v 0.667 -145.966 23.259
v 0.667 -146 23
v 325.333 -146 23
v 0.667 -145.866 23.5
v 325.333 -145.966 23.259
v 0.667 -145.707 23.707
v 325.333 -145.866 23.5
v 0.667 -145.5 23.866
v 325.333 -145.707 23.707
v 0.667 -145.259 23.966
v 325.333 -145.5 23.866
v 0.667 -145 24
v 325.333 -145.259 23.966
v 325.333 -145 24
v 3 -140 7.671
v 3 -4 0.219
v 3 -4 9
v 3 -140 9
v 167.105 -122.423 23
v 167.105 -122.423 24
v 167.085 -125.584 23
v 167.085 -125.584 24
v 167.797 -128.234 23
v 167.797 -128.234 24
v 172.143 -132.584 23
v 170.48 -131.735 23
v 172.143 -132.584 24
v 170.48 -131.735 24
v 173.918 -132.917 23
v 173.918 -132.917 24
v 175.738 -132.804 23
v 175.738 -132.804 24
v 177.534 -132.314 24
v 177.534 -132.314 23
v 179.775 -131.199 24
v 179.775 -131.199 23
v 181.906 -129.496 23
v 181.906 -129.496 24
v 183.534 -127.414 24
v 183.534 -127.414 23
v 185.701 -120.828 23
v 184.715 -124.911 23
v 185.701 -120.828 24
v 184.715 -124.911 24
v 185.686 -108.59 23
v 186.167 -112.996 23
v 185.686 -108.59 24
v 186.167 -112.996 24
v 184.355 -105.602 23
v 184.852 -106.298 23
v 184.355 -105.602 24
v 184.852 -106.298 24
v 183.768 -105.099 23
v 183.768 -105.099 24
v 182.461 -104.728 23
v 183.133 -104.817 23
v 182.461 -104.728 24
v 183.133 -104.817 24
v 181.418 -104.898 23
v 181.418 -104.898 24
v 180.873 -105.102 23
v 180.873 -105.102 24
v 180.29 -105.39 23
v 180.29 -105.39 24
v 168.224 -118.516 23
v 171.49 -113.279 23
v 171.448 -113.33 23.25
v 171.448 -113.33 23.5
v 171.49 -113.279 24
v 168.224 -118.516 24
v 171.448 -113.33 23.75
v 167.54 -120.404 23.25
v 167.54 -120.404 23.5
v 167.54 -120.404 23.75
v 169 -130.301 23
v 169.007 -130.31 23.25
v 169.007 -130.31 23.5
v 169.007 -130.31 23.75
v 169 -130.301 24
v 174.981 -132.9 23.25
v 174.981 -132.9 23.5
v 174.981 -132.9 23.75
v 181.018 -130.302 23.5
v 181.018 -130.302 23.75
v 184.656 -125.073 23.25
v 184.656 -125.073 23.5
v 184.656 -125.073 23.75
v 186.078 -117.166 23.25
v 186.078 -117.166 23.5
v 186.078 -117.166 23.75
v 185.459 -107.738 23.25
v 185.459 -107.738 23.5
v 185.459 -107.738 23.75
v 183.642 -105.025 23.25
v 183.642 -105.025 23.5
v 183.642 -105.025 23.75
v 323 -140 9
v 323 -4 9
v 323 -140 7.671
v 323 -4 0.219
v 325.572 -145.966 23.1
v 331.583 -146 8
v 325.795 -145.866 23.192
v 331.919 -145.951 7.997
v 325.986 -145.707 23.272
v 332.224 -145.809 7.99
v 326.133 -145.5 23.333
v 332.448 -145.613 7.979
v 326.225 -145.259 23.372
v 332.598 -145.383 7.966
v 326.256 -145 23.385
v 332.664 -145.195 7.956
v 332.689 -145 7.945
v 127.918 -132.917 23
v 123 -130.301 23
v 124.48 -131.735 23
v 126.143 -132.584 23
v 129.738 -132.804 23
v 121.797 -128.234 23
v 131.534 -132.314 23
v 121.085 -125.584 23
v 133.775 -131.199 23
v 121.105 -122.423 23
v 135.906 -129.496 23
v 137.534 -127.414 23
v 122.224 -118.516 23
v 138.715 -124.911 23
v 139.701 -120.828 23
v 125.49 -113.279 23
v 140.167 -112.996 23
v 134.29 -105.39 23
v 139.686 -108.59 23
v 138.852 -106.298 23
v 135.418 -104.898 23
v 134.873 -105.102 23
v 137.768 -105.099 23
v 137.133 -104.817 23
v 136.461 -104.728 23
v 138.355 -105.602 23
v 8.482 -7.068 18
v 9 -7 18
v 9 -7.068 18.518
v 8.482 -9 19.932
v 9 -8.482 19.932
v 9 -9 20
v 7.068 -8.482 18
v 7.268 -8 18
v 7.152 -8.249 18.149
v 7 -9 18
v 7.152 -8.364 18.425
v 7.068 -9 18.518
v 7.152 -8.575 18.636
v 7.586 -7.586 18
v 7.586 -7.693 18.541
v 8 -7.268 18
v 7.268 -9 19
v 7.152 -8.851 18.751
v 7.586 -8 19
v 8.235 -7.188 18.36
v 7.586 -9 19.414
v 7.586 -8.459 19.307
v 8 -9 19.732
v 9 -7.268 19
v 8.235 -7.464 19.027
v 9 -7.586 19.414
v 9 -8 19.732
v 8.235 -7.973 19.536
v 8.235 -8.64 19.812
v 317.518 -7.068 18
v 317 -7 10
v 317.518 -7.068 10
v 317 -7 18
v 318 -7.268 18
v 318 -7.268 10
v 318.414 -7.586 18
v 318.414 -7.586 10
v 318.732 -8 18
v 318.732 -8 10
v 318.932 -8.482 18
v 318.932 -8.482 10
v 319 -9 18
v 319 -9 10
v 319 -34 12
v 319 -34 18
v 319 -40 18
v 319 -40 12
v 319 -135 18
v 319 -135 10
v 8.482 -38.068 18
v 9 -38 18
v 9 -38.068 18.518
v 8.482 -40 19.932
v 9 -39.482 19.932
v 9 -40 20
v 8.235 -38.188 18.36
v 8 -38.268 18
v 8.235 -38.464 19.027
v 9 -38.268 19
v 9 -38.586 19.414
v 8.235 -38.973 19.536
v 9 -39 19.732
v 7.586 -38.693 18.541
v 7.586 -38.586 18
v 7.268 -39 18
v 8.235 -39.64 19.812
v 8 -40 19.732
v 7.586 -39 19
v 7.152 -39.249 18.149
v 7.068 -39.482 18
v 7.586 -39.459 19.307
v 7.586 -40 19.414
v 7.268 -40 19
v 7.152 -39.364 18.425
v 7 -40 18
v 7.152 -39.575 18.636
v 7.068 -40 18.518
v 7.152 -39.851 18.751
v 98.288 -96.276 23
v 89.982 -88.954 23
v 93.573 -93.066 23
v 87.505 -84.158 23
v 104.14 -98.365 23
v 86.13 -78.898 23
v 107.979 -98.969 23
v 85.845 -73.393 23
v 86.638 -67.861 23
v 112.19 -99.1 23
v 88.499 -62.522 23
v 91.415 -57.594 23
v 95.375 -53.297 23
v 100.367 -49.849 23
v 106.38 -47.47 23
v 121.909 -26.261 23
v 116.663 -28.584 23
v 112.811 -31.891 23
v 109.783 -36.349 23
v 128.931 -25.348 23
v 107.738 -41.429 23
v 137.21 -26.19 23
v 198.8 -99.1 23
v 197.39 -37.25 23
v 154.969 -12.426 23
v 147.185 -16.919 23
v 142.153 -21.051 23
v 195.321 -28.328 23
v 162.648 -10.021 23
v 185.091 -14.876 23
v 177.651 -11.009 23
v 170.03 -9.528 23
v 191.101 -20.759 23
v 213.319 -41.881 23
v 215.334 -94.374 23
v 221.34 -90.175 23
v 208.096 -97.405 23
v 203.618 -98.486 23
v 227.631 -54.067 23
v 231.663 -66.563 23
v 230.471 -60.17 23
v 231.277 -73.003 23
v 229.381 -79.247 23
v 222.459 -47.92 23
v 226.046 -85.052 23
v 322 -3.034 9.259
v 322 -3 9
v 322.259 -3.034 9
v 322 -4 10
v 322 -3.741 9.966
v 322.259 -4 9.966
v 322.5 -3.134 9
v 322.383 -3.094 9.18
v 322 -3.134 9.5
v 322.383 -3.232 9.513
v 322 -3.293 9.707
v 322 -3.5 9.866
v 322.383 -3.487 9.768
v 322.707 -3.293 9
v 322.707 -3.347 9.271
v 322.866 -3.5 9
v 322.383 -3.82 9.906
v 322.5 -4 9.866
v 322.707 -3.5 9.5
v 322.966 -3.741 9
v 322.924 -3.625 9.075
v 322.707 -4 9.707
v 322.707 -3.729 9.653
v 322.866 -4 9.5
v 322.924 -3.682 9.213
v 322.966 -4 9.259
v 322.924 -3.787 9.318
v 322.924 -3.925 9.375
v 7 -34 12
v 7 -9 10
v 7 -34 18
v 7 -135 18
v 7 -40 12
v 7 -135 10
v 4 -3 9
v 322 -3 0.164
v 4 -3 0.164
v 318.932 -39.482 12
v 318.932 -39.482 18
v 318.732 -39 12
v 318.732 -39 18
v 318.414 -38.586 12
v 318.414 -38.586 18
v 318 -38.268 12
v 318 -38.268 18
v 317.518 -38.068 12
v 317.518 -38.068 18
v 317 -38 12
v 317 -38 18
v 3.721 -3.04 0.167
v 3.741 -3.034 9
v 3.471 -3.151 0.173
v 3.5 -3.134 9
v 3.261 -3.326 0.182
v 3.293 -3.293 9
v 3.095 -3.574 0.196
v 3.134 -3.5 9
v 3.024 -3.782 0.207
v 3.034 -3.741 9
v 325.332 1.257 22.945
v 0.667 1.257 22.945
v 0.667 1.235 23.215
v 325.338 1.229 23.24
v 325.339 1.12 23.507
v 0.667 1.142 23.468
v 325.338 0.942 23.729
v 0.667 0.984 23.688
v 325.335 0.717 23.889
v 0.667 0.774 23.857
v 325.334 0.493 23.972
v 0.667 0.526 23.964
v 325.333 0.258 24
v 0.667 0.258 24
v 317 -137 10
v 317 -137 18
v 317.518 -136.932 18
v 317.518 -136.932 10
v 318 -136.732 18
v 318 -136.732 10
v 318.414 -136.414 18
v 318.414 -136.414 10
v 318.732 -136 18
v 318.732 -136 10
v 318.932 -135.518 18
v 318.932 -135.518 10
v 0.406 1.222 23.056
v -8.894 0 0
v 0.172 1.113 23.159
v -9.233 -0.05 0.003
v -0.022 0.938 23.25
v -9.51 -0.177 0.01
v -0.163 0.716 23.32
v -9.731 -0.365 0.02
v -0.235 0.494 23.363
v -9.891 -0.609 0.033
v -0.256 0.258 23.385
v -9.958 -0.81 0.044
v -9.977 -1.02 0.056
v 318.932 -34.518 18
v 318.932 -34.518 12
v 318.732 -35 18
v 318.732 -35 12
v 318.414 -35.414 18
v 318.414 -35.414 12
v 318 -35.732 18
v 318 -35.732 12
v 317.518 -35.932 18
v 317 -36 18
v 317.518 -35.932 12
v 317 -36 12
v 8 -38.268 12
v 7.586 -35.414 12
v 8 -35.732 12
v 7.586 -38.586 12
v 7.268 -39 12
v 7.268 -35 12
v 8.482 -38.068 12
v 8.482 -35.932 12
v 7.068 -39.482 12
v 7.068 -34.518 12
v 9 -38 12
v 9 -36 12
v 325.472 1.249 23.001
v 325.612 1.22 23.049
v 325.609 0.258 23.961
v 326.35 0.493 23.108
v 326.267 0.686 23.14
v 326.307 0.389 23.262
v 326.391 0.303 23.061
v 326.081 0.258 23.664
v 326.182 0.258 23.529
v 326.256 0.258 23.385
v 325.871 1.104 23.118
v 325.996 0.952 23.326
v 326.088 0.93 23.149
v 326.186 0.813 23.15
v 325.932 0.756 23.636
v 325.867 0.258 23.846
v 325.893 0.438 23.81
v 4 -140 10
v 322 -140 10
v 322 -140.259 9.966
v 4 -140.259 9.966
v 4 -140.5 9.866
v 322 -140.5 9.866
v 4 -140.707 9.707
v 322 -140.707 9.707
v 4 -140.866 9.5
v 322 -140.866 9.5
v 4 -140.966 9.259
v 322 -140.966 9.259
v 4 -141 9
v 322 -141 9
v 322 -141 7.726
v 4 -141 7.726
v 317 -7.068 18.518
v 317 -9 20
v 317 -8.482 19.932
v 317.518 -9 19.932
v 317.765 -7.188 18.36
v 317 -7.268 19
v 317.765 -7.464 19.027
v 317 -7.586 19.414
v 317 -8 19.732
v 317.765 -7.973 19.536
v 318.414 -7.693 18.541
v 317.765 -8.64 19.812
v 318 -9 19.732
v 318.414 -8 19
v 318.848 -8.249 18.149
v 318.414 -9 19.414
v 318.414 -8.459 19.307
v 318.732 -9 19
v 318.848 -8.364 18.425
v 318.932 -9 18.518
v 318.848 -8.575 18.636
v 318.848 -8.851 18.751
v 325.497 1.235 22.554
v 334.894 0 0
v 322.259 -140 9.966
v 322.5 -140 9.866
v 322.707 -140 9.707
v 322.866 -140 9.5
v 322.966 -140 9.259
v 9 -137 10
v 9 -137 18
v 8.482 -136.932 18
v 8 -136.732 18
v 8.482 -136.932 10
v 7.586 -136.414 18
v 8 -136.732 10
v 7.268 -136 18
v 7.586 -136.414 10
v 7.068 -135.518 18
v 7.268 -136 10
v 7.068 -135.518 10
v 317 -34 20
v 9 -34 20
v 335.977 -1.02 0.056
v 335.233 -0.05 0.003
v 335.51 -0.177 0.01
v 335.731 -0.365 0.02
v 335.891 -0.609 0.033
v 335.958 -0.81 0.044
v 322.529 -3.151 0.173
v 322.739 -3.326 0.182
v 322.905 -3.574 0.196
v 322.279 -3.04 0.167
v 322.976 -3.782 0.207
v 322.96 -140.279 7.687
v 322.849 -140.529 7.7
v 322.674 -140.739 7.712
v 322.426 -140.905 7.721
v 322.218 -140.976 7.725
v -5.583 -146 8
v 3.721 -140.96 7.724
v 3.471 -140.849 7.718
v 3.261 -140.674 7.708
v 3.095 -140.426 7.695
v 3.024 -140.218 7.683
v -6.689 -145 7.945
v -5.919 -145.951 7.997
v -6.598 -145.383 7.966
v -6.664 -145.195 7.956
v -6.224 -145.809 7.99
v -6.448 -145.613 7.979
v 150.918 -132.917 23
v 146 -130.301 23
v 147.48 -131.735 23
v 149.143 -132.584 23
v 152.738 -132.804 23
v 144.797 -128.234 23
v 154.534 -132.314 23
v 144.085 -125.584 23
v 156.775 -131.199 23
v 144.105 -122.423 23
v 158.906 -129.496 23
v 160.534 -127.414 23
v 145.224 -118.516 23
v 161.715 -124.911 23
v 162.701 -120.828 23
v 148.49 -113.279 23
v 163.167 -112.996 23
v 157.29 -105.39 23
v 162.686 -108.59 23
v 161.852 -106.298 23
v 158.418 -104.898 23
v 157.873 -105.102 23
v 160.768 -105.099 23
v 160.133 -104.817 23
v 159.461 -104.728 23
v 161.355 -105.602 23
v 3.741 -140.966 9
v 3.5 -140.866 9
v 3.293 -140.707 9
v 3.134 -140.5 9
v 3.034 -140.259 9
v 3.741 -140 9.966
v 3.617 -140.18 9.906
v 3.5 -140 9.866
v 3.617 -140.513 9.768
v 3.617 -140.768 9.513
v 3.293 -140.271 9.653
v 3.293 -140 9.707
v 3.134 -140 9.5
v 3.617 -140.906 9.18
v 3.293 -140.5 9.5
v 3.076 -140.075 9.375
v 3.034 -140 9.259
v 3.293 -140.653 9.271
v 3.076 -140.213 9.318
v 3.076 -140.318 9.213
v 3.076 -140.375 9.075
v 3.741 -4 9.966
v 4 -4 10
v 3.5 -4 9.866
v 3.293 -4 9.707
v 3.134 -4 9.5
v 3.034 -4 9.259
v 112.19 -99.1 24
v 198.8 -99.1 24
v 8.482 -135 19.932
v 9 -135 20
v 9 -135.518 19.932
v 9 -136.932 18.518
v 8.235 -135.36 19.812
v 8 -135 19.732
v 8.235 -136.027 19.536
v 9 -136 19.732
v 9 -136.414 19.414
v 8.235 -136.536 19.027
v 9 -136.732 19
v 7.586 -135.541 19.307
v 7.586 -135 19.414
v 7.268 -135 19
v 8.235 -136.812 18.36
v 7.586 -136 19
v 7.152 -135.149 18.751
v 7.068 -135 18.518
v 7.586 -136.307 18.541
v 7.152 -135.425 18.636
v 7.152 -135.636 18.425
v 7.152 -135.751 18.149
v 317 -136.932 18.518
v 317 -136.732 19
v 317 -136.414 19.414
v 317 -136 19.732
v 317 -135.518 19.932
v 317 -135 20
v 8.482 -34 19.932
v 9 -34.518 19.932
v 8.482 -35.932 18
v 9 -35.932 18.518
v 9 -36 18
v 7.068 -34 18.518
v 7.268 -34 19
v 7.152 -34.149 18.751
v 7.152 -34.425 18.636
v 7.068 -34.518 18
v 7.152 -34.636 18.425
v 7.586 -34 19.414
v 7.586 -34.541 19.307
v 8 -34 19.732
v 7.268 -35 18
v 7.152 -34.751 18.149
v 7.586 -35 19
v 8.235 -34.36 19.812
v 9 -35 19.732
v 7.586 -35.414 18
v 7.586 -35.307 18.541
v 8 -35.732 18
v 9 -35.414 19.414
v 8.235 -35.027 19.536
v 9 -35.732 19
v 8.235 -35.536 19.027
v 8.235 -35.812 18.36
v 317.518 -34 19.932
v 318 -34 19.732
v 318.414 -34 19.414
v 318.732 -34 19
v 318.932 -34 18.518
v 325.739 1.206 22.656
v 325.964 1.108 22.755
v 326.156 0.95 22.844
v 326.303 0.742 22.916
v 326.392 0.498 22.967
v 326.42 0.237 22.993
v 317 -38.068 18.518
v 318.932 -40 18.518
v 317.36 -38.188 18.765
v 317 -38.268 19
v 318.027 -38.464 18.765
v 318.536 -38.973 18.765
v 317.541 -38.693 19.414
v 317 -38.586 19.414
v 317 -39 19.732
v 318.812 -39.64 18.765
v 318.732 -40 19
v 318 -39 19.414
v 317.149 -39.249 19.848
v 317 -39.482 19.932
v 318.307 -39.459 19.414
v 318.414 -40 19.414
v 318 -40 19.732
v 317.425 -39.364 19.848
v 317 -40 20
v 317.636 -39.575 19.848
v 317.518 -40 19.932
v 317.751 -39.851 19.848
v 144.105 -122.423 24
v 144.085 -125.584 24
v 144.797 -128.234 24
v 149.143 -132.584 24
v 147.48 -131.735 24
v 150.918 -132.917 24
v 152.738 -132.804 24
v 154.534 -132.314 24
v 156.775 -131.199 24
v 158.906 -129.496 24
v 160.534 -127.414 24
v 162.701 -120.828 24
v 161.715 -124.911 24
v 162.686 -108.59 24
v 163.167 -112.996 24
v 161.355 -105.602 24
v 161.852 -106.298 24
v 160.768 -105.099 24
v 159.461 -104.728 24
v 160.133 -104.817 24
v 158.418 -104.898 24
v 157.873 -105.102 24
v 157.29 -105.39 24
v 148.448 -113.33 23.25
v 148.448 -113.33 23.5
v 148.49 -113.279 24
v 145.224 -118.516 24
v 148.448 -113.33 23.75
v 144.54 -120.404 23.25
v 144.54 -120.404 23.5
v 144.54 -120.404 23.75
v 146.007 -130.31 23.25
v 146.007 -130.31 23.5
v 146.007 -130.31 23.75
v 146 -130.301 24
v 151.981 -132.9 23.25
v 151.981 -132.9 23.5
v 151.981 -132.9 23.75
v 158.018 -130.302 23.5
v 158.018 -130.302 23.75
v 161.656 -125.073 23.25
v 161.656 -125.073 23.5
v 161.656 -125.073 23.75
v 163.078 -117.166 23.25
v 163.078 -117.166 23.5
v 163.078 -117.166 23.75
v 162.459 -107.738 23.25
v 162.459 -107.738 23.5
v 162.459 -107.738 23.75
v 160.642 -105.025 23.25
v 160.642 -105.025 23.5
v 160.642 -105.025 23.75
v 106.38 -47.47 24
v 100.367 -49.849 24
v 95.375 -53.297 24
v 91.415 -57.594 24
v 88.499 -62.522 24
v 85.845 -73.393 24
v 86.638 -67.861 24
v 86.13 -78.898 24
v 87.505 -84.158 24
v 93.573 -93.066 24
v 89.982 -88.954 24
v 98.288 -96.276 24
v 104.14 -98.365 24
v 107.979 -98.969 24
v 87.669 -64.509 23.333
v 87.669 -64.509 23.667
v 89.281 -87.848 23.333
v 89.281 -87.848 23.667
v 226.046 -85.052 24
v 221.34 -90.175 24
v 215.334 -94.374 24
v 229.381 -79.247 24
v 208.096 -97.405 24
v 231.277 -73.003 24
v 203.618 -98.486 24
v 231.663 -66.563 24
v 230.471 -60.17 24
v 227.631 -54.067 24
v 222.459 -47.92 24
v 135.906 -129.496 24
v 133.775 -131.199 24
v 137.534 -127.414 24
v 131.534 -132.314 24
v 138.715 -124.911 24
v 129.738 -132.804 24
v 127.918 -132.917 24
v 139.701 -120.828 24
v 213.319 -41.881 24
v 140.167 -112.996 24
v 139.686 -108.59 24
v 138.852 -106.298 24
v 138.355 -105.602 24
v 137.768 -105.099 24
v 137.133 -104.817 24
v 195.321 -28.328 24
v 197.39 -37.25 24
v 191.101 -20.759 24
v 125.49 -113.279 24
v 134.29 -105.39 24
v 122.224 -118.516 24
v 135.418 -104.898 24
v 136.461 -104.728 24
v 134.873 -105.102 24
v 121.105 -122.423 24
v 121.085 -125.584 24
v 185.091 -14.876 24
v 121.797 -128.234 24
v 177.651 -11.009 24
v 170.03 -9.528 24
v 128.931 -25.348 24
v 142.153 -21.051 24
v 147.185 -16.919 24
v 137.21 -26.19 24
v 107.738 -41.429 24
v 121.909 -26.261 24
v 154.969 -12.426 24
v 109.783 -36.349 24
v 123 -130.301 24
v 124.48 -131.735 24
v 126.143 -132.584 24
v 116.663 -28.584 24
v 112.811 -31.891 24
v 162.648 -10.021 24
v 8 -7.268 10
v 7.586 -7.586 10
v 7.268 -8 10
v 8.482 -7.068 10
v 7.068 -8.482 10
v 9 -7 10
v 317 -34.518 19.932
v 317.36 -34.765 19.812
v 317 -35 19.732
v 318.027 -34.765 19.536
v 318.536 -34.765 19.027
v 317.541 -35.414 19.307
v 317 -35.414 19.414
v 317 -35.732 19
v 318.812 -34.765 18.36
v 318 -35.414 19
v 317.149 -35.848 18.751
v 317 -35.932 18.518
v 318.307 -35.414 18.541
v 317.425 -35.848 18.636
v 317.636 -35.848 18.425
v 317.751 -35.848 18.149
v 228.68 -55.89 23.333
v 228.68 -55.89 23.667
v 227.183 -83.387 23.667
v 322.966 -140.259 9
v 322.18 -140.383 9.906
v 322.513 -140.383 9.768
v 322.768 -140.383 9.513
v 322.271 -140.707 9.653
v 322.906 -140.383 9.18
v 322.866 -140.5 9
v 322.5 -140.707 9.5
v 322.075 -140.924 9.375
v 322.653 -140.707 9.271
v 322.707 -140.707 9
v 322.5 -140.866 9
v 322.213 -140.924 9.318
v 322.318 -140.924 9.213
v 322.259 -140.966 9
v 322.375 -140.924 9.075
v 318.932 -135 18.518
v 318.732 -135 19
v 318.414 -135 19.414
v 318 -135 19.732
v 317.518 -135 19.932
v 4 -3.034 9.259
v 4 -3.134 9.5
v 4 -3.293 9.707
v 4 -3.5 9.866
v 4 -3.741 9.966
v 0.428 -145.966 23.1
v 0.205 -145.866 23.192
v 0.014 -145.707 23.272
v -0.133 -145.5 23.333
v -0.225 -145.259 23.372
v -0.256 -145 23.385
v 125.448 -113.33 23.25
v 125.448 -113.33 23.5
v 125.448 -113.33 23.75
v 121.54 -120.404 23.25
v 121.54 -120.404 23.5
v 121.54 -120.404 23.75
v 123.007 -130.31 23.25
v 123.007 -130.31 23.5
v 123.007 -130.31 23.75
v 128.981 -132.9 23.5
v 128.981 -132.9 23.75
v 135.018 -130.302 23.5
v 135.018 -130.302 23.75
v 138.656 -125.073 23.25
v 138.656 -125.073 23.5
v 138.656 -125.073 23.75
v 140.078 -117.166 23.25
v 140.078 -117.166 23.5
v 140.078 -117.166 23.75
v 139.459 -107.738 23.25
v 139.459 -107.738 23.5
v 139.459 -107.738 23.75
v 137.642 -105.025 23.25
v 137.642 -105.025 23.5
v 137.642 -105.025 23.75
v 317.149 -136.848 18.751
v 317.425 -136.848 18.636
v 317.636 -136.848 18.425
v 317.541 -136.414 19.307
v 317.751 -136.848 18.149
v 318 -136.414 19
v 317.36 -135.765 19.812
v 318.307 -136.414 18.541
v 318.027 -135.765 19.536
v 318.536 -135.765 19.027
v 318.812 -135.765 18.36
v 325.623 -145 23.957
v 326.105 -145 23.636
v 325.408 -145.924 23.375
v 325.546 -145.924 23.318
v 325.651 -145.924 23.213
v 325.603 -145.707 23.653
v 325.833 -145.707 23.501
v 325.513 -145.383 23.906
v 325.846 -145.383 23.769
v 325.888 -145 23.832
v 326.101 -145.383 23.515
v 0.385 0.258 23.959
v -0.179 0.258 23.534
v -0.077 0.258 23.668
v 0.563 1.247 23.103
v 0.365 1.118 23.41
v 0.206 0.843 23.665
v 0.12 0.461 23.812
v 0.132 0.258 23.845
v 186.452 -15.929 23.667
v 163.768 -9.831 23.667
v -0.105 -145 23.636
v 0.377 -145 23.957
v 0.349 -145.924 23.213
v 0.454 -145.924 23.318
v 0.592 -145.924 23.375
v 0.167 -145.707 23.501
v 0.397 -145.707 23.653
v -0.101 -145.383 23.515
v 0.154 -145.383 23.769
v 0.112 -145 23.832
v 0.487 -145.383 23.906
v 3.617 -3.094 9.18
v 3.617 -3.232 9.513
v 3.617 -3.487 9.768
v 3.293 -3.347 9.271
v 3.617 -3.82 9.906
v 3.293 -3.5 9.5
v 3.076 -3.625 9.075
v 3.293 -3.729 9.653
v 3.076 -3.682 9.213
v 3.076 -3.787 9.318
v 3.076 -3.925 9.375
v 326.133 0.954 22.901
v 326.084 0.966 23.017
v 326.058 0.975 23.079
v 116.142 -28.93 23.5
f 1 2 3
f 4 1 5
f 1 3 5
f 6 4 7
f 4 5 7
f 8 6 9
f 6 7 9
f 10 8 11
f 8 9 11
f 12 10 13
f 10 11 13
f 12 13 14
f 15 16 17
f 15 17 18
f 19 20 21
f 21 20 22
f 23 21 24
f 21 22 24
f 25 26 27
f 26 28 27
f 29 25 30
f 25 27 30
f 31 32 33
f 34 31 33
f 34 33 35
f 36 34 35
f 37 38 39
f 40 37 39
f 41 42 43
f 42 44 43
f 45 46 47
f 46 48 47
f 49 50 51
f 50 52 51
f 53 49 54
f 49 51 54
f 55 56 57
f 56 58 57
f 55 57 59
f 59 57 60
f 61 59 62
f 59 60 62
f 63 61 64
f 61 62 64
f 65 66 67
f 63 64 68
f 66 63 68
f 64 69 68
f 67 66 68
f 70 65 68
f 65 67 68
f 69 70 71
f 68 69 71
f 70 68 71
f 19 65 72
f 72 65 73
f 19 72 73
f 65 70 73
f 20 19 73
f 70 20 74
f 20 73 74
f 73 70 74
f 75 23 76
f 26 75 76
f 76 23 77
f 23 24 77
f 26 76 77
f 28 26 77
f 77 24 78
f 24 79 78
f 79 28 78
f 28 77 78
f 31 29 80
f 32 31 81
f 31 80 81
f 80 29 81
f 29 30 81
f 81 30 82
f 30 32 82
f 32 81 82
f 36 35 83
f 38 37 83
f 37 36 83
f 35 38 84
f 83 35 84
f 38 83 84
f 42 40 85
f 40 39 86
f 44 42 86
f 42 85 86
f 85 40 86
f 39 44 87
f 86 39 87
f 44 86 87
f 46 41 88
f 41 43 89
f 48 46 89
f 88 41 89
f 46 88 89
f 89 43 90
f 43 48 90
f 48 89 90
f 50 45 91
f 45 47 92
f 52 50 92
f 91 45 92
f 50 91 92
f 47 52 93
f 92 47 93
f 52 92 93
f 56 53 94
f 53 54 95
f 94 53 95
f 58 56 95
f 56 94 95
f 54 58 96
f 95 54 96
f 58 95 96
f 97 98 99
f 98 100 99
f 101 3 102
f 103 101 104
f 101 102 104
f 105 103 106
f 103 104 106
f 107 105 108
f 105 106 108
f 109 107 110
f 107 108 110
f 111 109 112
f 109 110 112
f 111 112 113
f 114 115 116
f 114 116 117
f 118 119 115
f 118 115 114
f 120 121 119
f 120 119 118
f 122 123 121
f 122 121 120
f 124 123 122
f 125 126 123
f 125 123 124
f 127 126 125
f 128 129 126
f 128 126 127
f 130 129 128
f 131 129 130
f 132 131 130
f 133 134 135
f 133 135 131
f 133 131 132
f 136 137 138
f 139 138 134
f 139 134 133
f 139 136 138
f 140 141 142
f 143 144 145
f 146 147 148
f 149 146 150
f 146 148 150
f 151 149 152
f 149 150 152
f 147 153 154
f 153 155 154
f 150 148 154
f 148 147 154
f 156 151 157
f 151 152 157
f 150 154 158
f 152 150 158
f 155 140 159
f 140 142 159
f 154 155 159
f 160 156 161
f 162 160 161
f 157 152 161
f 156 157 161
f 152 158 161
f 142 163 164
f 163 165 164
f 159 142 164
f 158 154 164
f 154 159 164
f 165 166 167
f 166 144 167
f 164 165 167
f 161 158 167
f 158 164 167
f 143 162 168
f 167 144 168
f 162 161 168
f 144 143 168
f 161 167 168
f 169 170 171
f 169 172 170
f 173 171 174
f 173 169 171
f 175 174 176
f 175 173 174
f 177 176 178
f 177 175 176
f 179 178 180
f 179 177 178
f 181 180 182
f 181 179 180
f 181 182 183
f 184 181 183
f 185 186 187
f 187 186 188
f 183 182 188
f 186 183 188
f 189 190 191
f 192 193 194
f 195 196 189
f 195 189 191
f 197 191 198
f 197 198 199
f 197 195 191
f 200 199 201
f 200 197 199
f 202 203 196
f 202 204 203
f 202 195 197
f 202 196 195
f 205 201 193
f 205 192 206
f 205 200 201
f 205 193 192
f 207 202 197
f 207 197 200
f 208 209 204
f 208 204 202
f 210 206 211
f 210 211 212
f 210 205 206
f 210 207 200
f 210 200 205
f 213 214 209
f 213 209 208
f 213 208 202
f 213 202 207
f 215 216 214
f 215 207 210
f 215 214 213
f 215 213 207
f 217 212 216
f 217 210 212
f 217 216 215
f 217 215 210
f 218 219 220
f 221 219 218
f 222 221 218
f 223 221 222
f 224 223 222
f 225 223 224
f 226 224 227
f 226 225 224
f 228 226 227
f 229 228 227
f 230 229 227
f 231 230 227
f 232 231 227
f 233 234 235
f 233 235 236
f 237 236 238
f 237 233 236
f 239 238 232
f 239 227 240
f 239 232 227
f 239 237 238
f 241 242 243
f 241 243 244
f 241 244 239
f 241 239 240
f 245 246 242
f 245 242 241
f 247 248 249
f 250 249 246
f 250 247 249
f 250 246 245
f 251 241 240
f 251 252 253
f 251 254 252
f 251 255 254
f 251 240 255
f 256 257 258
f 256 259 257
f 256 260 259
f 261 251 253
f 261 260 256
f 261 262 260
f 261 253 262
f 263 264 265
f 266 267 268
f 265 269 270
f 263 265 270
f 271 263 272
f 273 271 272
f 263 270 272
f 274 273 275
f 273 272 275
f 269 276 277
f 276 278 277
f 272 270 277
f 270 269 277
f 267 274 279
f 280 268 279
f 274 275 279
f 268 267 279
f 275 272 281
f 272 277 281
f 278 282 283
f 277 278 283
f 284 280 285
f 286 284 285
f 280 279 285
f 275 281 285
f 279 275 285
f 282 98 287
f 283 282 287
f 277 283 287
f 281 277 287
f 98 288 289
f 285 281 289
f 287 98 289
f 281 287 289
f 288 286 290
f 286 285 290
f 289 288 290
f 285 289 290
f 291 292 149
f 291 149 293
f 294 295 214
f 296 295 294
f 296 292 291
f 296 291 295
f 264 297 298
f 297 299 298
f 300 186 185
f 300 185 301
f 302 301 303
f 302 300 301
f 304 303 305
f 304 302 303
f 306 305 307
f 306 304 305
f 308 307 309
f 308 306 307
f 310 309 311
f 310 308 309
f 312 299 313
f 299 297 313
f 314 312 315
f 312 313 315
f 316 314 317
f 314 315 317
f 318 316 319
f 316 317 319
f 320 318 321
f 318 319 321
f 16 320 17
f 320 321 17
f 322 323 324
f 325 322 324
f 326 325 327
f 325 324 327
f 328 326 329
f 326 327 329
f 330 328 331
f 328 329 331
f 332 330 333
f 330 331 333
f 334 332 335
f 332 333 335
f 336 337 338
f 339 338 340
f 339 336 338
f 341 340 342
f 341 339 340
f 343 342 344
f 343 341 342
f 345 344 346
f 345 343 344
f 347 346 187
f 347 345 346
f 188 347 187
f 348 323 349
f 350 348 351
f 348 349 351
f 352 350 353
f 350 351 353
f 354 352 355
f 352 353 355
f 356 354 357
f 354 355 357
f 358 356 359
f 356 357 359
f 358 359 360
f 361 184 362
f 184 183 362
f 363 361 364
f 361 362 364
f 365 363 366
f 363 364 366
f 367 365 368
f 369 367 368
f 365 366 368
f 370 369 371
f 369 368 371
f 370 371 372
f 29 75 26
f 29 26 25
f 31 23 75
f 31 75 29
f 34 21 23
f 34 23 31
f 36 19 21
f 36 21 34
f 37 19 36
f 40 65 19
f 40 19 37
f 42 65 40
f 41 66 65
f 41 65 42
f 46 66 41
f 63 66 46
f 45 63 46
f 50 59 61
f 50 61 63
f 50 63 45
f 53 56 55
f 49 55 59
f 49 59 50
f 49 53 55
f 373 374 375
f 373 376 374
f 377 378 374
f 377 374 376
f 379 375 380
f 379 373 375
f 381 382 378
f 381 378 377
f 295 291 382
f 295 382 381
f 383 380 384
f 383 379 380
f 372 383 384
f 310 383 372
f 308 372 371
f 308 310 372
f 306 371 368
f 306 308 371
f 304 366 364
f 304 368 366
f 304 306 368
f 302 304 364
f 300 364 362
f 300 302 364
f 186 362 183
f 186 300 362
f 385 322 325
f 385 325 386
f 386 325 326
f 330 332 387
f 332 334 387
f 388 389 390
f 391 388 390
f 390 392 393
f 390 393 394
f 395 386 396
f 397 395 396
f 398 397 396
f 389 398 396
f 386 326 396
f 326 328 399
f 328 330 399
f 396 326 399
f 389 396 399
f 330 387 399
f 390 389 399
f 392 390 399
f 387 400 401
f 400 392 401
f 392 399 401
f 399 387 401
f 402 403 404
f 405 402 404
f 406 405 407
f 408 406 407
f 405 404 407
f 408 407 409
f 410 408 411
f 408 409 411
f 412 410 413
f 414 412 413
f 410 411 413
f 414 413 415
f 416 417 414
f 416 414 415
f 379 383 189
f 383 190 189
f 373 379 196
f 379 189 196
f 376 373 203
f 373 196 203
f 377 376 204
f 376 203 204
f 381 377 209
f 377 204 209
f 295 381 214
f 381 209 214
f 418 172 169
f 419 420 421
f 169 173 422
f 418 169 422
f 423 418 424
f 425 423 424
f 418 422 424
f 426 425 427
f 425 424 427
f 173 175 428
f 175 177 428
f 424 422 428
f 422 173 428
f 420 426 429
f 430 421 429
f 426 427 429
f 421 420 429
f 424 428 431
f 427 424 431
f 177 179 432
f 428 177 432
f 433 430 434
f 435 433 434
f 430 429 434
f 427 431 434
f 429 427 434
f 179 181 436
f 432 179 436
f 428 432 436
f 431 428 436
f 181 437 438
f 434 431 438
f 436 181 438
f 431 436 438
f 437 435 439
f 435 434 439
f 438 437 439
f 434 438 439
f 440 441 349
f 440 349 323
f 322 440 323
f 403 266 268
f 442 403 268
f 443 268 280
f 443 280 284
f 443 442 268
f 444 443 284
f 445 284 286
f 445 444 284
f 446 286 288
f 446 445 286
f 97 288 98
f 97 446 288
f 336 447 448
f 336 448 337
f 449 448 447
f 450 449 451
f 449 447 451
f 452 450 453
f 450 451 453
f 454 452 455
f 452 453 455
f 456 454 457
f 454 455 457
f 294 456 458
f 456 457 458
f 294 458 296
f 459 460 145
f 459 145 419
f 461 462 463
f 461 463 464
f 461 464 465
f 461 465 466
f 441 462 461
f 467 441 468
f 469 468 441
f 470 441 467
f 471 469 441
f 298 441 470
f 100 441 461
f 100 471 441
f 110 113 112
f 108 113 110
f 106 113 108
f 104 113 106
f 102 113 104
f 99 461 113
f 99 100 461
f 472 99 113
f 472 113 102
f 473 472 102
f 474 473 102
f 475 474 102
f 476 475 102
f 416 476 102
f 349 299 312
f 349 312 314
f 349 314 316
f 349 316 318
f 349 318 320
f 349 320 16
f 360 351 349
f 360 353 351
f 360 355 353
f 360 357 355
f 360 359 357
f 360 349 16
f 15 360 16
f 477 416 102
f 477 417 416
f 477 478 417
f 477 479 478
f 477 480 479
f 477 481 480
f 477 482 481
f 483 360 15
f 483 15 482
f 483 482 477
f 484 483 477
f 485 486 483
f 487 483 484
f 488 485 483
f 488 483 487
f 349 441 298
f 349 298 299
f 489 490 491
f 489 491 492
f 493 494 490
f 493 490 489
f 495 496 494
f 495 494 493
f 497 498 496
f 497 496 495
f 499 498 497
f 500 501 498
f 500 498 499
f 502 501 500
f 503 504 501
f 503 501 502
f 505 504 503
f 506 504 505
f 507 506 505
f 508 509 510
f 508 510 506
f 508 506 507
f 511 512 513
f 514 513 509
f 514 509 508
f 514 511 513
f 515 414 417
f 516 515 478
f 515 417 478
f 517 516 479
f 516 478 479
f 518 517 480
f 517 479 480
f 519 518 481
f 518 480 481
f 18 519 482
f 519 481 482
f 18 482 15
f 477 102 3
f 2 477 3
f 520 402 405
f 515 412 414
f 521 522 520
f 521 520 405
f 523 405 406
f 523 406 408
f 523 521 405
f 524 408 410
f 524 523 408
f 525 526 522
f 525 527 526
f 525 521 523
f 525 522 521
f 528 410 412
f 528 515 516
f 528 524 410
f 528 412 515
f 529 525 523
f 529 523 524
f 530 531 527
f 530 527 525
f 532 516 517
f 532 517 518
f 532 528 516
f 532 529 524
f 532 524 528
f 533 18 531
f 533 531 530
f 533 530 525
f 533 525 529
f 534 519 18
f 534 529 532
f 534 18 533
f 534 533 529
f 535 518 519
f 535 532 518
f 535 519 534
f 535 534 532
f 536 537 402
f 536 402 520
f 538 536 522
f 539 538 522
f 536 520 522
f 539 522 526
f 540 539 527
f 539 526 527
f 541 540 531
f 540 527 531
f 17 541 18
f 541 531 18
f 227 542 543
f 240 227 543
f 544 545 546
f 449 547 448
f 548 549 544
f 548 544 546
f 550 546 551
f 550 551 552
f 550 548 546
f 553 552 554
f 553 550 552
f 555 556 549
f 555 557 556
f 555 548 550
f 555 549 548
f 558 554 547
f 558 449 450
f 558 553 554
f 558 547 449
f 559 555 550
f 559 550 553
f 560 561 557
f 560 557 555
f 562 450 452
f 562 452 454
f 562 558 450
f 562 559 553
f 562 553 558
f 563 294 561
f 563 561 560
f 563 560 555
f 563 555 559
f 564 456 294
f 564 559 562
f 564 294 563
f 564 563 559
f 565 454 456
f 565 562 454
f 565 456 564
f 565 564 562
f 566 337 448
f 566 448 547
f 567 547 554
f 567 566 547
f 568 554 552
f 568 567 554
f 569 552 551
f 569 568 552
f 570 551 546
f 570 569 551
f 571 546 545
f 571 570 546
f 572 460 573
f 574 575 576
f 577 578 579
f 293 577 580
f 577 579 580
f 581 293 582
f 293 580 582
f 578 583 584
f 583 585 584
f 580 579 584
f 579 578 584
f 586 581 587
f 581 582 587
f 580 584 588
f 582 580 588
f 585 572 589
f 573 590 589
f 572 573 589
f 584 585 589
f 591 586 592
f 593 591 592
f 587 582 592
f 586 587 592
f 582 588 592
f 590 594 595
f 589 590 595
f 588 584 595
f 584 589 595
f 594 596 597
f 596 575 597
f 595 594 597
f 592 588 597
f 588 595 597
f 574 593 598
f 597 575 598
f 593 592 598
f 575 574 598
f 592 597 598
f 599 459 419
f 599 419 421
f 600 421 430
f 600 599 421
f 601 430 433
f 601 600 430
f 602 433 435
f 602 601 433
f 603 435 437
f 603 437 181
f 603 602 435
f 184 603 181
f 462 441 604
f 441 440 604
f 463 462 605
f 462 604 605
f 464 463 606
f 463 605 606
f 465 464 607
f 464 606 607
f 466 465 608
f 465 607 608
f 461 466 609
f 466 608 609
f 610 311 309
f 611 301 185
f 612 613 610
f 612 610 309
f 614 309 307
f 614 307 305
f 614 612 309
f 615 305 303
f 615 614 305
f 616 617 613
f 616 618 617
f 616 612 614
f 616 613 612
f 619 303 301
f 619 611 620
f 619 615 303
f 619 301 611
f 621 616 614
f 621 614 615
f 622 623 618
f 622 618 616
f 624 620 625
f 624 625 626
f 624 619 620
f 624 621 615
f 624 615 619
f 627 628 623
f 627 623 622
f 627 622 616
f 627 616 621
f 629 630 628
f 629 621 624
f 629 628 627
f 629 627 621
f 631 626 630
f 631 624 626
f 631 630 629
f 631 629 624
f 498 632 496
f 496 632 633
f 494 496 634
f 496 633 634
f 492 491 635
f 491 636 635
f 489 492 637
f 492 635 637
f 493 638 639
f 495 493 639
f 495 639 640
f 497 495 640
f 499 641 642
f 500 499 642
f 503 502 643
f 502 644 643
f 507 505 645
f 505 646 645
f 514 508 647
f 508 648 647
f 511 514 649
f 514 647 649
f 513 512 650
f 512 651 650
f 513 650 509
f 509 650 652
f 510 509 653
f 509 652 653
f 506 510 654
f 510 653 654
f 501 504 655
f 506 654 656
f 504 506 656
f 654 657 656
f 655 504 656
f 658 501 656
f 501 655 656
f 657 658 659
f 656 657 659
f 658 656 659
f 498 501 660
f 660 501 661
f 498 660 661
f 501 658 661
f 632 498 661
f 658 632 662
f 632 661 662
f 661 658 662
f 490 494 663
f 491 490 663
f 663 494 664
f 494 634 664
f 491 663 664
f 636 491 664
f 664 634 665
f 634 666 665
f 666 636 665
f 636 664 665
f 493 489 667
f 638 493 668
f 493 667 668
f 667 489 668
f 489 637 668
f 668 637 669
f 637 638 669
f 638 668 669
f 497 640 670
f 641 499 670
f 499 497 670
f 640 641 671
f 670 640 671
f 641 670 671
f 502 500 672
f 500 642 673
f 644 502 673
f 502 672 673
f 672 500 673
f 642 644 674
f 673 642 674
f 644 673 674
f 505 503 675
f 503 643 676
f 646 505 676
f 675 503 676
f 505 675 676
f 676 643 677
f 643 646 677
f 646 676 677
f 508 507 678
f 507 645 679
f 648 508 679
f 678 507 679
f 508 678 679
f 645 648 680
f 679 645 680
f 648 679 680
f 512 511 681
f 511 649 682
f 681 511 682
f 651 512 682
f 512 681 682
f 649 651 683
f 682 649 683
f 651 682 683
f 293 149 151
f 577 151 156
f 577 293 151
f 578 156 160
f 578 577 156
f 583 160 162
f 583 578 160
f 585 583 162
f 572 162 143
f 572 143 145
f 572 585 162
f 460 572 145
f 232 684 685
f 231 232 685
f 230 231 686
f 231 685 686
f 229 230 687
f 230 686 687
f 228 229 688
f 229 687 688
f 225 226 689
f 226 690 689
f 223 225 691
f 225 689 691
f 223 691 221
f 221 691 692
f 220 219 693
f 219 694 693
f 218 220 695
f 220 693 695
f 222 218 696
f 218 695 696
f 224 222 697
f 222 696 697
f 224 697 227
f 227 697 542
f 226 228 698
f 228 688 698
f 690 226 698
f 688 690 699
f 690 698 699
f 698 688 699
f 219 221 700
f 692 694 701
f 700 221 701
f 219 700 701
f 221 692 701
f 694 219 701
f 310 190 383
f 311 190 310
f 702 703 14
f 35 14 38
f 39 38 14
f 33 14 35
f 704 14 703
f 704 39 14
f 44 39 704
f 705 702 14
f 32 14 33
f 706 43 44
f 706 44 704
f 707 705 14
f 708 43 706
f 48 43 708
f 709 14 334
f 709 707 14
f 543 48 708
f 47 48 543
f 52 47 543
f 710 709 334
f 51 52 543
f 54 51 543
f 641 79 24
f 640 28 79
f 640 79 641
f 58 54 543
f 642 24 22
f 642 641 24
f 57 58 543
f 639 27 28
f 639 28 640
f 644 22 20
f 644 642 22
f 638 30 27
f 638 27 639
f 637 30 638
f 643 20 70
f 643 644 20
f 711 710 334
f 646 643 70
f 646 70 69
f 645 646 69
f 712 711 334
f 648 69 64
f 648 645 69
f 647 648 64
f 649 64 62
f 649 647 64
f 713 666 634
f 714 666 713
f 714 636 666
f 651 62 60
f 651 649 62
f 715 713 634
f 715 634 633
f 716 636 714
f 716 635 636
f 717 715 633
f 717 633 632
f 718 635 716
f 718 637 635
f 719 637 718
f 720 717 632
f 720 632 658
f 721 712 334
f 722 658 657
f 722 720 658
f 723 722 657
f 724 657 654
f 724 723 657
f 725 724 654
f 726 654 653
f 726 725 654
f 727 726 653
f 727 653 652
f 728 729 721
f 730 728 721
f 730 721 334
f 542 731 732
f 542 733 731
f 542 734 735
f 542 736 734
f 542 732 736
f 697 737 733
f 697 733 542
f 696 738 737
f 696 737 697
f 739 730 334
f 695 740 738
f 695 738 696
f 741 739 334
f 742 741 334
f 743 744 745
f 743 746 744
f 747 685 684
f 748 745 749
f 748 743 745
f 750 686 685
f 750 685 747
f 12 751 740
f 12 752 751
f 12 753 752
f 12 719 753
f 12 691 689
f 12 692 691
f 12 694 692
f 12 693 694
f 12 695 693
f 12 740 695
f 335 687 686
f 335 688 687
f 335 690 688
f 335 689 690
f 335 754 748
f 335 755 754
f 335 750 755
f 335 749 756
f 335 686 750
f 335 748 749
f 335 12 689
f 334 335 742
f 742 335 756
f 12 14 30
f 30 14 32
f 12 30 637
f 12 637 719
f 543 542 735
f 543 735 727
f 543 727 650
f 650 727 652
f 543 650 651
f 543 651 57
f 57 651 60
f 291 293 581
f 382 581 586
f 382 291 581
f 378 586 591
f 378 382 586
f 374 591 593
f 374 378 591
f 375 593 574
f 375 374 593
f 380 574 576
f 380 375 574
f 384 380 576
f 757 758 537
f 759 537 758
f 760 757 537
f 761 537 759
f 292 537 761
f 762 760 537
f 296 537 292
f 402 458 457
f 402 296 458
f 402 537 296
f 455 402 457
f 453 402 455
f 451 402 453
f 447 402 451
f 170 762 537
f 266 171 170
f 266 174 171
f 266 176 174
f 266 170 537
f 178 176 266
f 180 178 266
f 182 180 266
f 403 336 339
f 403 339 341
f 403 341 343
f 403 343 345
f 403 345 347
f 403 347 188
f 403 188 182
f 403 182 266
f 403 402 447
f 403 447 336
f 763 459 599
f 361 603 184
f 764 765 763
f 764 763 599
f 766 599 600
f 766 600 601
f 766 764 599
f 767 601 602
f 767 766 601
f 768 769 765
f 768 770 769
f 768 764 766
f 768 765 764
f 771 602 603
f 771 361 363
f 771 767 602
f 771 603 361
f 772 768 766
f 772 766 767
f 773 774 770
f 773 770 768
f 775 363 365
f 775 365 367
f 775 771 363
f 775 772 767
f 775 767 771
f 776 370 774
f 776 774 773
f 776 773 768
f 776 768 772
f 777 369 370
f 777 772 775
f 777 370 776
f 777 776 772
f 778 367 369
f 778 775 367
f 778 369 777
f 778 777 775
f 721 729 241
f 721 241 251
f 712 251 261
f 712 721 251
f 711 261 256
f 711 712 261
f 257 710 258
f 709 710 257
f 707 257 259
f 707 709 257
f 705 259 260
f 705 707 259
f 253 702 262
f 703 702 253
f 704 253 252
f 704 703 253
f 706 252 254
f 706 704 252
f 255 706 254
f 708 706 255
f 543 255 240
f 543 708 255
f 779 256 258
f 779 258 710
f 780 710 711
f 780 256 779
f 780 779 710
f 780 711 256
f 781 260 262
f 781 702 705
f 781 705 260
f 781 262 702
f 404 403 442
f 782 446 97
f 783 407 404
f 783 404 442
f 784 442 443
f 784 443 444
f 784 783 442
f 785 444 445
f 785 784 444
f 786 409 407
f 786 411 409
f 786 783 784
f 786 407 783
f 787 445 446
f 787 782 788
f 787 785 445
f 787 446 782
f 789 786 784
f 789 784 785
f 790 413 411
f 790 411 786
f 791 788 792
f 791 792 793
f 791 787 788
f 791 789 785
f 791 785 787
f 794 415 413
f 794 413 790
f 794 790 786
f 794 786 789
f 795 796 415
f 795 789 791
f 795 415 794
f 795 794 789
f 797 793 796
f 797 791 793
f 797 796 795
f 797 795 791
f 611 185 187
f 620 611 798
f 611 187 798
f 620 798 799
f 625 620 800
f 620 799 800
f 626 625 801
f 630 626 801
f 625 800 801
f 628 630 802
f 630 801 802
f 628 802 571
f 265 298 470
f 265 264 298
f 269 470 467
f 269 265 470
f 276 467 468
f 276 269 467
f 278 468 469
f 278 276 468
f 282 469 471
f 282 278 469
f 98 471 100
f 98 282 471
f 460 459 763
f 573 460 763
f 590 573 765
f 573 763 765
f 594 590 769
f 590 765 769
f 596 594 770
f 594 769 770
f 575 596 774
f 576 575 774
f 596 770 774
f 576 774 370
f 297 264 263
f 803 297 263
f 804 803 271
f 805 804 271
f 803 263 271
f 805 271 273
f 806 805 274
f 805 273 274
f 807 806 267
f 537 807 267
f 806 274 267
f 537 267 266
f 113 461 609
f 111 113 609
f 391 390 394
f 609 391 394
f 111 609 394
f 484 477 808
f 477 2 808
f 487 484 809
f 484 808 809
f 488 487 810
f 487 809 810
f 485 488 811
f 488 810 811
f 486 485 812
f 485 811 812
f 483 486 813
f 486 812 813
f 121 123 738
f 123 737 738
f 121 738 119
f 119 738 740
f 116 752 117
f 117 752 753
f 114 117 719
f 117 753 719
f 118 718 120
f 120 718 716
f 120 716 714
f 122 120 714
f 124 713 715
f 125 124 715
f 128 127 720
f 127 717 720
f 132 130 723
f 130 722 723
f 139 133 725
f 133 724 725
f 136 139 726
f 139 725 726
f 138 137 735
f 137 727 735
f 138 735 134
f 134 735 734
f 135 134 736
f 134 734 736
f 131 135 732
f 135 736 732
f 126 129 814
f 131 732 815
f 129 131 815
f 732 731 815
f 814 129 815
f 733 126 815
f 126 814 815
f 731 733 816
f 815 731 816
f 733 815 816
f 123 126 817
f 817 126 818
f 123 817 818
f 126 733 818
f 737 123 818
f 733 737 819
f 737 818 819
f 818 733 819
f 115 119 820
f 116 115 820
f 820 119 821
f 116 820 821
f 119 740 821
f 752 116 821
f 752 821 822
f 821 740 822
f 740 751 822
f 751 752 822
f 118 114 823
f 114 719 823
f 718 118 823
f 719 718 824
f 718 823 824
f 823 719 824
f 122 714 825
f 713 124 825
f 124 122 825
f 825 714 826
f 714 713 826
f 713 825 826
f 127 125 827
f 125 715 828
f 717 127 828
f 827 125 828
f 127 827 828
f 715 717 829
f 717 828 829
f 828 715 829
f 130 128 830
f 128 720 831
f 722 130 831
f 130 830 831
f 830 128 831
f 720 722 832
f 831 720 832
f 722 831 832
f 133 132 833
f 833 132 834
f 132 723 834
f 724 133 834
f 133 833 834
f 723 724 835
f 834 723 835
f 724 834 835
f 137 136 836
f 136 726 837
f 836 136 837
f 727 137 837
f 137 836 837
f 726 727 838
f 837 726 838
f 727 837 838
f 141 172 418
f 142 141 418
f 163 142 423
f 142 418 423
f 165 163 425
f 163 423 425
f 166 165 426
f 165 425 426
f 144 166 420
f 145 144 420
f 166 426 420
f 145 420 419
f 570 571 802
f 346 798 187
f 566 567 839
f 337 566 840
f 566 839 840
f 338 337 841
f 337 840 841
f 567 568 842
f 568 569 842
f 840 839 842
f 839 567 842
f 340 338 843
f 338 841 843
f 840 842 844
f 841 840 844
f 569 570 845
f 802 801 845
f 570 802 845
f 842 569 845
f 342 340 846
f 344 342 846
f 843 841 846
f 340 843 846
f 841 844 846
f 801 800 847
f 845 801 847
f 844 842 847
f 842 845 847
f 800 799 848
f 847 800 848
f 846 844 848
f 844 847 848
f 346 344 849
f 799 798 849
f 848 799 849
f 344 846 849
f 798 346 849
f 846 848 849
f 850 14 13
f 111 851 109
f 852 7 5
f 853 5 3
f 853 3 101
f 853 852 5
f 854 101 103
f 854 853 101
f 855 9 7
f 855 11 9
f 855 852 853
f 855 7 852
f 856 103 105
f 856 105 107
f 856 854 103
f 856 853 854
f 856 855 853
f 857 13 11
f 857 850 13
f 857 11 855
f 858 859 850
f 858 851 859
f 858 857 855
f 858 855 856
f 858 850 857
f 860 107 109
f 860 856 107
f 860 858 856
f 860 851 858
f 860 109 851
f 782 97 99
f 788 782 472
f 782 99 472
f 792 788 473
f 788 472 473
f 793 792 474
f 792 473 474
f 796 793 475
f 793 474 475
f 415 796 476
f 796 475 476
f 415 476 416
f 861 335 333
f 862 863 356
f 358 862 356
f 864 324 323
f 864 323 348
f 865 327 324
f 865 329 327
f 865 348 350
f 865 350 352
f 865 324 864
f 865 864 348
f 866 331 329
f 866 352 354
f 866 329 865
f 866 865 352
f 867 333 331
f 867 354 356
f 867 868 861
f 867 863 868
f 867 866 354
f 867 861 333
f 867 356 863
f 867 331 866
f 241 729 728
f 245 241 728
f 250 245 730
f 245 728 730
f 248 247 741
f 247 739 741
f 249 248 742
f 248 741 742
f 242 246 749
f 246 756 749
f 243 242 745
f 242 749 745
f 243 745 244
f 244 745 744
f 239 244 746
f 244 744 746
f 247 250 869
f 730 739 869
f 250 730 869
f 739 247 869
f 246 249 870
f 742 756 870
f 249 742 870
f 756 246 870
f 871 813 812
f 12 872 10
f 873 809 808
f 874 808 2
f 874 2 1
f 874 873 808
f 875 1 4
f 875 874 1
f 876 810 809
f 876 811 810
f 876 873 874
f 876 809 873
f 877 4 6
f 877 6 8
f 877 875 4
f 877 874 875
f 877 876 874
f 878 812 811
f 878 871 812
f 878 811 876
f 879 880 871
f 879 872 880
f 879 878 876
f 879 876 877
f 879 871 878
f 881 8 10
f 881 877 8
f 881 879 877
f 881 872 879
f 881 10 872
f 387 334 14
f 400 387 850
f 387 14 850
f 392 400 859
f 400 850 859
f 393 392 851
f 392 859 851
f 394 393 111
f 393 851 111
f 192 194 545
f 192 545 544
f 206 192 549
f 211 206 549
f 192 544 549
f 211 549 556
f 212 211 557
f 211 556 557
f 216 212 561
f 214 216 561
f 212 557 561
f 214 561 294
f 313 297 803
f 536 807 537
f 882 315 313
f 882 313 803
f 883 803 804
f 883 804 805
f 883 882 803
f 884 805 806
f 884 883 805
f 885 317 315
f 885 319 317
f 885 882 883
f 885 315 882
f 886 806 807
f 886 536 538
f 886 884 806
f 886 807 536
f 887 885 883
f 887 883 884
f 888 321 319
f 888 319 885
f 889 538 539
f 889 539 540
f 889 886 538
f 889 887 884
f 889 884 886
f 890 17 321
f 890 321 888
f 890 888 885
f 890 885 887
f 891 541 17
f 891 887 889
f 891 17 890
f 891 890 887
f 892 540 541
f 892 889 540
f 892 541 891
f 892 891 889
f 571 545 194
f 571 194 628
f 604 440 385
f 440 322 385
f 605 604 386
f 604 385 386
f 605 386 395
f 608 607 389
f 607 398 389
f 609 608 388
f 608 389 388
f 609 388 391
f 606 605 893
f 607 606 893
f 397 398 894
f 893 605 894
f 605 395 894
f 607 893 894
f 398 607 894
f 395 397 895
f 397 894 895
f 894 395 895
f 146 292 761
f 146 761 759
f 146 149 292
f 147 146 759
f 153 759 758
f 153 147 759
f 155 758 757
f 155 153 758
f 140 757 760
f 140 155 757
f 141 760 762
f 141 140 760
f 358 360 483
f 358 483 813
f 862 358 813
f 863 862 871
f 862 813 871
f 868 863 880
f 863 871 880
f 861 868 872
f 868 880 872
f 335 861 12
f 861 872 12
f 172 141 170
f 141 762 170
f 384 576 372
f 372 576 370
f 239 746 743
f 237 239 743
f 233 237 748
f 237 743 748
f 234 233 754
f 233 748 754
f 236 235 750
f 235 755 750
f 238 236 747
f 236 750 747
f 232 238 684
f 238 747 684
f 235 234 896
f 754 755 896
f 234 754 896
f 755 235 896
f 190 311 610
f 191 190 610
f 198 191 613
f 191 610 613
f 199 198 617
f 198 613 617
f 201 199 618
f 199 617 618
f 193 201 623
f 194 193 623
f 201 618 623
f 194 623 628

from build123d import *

# Parameters (mm, degrees)
SKETCH_W        = 326
SKETCH_H        = 146
PAD_DEPTH       = 24
SKETCH001_W     = 320
SKETCH001_H     = 138
POCKET_DEPTH    = 10
POCKET001_DEPTH = 350
SKETCH003_W     = 312
SKETCH003_H     = 130
POCKET002_DEPTH = 10
SKETCH004_W     = 312
SKETCH004_H     = 2
PAD001_DEPTH    = 8
POCKET003_DEPTH = 1
POCKET004_DEPTH = 1
SKETCH007_W     = 326
SKETCH007_H     = 24
PAD002_DEPTH    = 10
PAD003_DEPTH    = 20
PAD004_DEPTH    = 20
POCKET005_DEPTH = 160
POCKET006_DEPTH = 380
POCKET007_DEPTH = 360
FILLET_R        = 1
FILLET001_R     = 1
FILLET002_R     = 1
FILLET003_R     = 1
FILLET004_R     = 1
FILLET005_R     = 1
FILLET006_R     = 1
FILLET007_R     = 1
FILLET008_R     = 2
FILLET009_R     = 2
FILLET010_R     = 2
FILLET011_R     = 2
FILLET012_R     = 2
FILLET013_R     = 2
FILLET014_R     = 2
FILLET015_R     = 2


with BuildPart() as part:
    # Sketch → Pad (new body)
    with BuildSketch(Plane.XY):
        with Locations((163, -73)):
            Rectangle(SKETCH_W, SKETCH_H)
    extrude(amount=PAD_DEPTH)

    # Sketch001 (on Face5 of Pad) → Pocket (cut)
    with BuildSketch(Plane(origin=(0, 0, 0), x_dir=(1, 0, 0), z_dir=(0, 0, -1))):
        with Locations((163, 72)):
            Rectangle(SKETCH001_W, SKETCH001_H)
    extrude(amount=-POCKET_DEPTH, mode=Mode.SUBTRACT)

    # Sketch002 (on Face2 of Pocket) → Pocket001 (cut)
    with BuildSketch(Plane(origin=(0, 0, 0), x_dir=(0, -1, 0), z_dir=(-1, 0, 0))):
        Polygon((0, 0), (146, 0), (146, 8), align=None)
    extrude(amount=-POCKET001_DEPTH, mode=Mode.SUBTRACT)

    # Sketch003 (on Face11 of Pocket001) → Pocket002 (cut)
    with BuildSketch(Plane(origin=(0, 0, 10), x_dir=(1, 0, 0), z_dir=(0, 0, -1))):
        with Locations((163, 72)):
            Rectangle(SKETCH003_W, SKETCH003_H)
    extrude(amount=-POCKET002_DEPTH, mode=Mode.SUBTRACT)

    # Sketch004 (on Face16 of Pocket002) → Pad001 (join)
    with BuildSketch(Plane(origin=(0, 0, 20), x_dir=(1, 0, 0), z_dir=(0, 0, -1))):
        with Locations((163, 37)):
            Rectangle(SKETCH004_W, SKETCH004_H)
    extrude(amount=PAD001_DEPTH)

    # Sketch005 (on Face5 of Pad001) → Pocket003 (cut)
    with BuildSketch(Plane.XY.offset(24)):
        with BuildLine():
            add(Edge.make_bspline(
                [(197.39, -37.25), (194.95, -10.73), (163.08, 3.81), (137.21, -26.19)],
                knots=[0, 0, 0, 0, 1, 1, 1, 1], degree=3))
            add(Edge.make_bspline(
                [(137.21, -26.19), (110.49, -21.03), (106.38, -47.47)],
                knots=[0, 0, 0, 1, 1, 1], degree=2))
            add(Edge.make_bspline(
                [(106.38, -47.47), (77.83, -55.23), (78.31, -100.02), (112.19, -99.1)],
                knots=[0, 0, 0, 0, 1, 1, 1, 1], degree=3))
            Line((112.19, -99.1), (198.8, -99.1))
            add(Edge.make_bspline(
                [(197.39, -37.25), (247.04, -44.58), (238.66, -96.16), (198.8, -99.1)],
                knots=[0, 0, 0, 0, 1, 1, 1, 1], degree=3))
        make_face()
    extrude(amount=-POCKET003_DEPTH, mode=Mode.SUBTRACT)

    # Sketch006 (on Face5 of Pocket003) → Pocket004 (cut)
    with BuildSketch(Plane.XY.offset(24)):
        with BuildLine():
            add(Edge.make_bspline(
                [(134.29, -105.39), (118.6, -116.37), (120.88, -135.91), (137.06, -131.62), (140.99, -119.42), (139.96, -102.27), (134.29, -105.39)],
                knots=[0, 0, 0, 0, 0.25, 0.5, 0.75, 1, 1, 1, 1], degree=3))
        make_face()
        with BuildLine():
            add(Edge.make_bspline(
                [(157.29, -105.39), (141.6, -116.37), (143.88, -135.91), (160.06, -131.62), (163.99, -119.42), (162.96, -102.27), (157.29, -105.39)],
                knots=[0, 0, 0, 0, 0.25, 0.5, 0.75, 1, 1, 1, 1], degree=3))
        make_face()
        with BuildLine():
            add(Edge.make_bspline(
                [(180.29, -105.39), (164.6, -116.37), (166.88, -135.91), (183.06, -131.62), (186.99, -119.42), (185.96, -102.27), (180.29, -105.39)],
                knots=[0, 0, 0, 0, 0.25, 0.5, 0.75, 1, 1, 1, 1], degree=3))
        make_face()
    extrude(amount=-POCKET004_DEPTH, mode=Mode.SUBTRACT)

    # Sketch007 (on Face1 of Pocket004) → Pad002 (join)
    with BuildSketch(Plane(origin=(0, 0, 0), x_dir=(-1, 0, 0), z_dir=(0, 1, 0))):
        with Locations((-163, 12)):
            Rectangle(SKETCH007_W, SKETCH007_H)
    extrude(amount=PAD002_DEPTH)

    # Sketch009 (on Face1 of Pad002) → Pad003 (join)
    with BuildSketch(Plane(origin=(0, 0, 0), x_dir=(0, -1, 0), z_dir=(-1, 0, 0))):
        Polygon((-10, 24), (-10, 0), (0, 0), (146, 8), (146, 24), align=None)
    extrude(amount=PAD003_DEPTH)

    # Sketch010 (on Face4 of Pad003) → Pad004 (join)
    with BuildSketch(Plane.YZ.offset(326)):
        Polygon((10, 24), (10, 0), (0, 0), (-146, 8), (-146, 24), align=None)
    extrude(amount=PAD004_DEPTH)

    # Sketch011 (on Face19 of Pad004) → Pocket005 (cut)
    with BuildSketch(Plane(origin=(0, 10, 0), x_dir=(-1, 0, 0), z_dir=(0, 1, 0))):
        Polygon((10, 0), (0, 24), (62.814814, 43.289979), (90.06, 0), align=None)
    extrude(amount=-POCKET005_DEPTH, mode=Mode.SUBTRACT)

    # Sketch012 (on Face30 of Pocket005) → Pocket006 (cut)
    with BuildSketch(Plane(origin=(0, 10, 0), x_dir=(-1, 0, 0), z_dir=(0, 1, 0))):
        Polygon((-383.56, 0), (-336, 0), (-326, 24), (-386.967866, 53.431433), align=None)
    extrude(amount=-POCKET006_DEPTH, mode=Mode.SUBTRACT)

    # Sketch013 → Pocket007 (cut, symmetric)
    with BuildSketch(Plane.YZ):
        Polygon((0, 0), (3.1, 56.61), (76.09231, 25.718735), (62.818003, -34.69), align=None)
    extrude(amount=POCKET007_DEPTH, both=True, mode=Mode.SUBTRACT)

    # Fillet
    fillet_edges = [part.edges().sort_by_distance(p)[0] for p in [
        (0, 0.657128, 24),
    ]]
    fillet(fillet_edges, radius=FILLET_R)

    # Fillet001
    fillet001_edges = [part.edges().sort_by_distance(p)[0] for p in [
        (163.333333, 1.314255, 24),
    ]]
    fillet(fillet001_edges, radius=FILLET001_R)

    # Fillet002
    fillet002_edges = [part.edges().sort_by_distance(p)[0] for p in [
        (326, -73, 24),
    ]]
    fillet(fillet002_edges, radius=FILLET002_R)

    # Fillet003
    fillet003_edges = [part.edges().sort_by_distance(p)[0] for p in [
        (329.461538, -146, 15.692308),
    ]]
    fillet(fillet003_edges, radius=FILLET003_R)

    # Fillet004
    fillet004_edges = [part.edges().sort_by_distance(p)[0] for p in [
        (163, -3, 10),
    ]]
    fillet(fillet004_edges, radius=FILLET004_R)

    # Fillet005
    fillet005_edges = [part.edges().sort_by_distance(p)[0] for p in [
        (323, -72.5, 10),
    ]]
    fillet(fillet005_edges, radius=FILLET005_R)

    # Fillet006
    fillet006_edges = [part.edges().sort_by_distance(p)[0] for p in [
        (162.5, -141, 10),
    ]]
    fillet(fillet006_edges, radius=FILLET006_R)

    # Fillet007
    fillet007_edges = [part.edges().sort_by_distance(p)[0] for p in [
        (3, -72, 10),
    ]]
    fillet(fillet007_edges, radius=FILLET007_R)

    # Fillet008
    fillet008_edges = [part.edges().sort_by_distance(p)[0] for p in [
        (163, -7, 20),
    ]]
    fillet(fillet008_edges, radius=FILLET008_R)

    # Fillet009
    fillet009_edges = [part.edges().sort_by_distance(p)[0] for p in [
        (319, -7, 14),
    ]]
    fillet(fillet009_edges, radius=FILLET009_R)

    # Fillet010
    fillet010_edges = [part.edges().sort_by_distance(p)[0] for p in [
        (162, -36, 20),
    ]]
    fillet(fillet010_edges, radius=FILLET010_R)

    # Fillet011
    fillet011_edges = [part.edges().sort_by_distance(p)[0] for p in [
        (7, -21.5, 20),
    ]]
    fillet(fillet011_edges, radius=FILLET011_R)

    # Fillet012
    fillet012_edges = [part.edges().sort_by_distance(p)[0] for p in [
        (319, -38, 16),
    ]]
    fillet(fillet012_edges, radius=FILLET012_R)

    # Fillet013
    fillet013_edges = [part.edges().sort_by_distance(p)[0] for p in [
        (319, -88.5, 20),
    ]]
    fillet(fillet013_edges, radius=FILLET013_R)

    # Fillet014
    fillet014_edges = [part.edges().sort_by_distance(p)[0] for p in [
        (162, -137, 20),
    ]]
    fillet(fillet014_edges, radius=FILLET014_R)

    # Fillet015
    fillet015_edges = [part.edges().sort_by_distance(p)[0] for p in [
        (7, -87.5, 20),
    ]]
    fillet(fillet015_edges, radius=FILLET015_R)


solid = part.part
